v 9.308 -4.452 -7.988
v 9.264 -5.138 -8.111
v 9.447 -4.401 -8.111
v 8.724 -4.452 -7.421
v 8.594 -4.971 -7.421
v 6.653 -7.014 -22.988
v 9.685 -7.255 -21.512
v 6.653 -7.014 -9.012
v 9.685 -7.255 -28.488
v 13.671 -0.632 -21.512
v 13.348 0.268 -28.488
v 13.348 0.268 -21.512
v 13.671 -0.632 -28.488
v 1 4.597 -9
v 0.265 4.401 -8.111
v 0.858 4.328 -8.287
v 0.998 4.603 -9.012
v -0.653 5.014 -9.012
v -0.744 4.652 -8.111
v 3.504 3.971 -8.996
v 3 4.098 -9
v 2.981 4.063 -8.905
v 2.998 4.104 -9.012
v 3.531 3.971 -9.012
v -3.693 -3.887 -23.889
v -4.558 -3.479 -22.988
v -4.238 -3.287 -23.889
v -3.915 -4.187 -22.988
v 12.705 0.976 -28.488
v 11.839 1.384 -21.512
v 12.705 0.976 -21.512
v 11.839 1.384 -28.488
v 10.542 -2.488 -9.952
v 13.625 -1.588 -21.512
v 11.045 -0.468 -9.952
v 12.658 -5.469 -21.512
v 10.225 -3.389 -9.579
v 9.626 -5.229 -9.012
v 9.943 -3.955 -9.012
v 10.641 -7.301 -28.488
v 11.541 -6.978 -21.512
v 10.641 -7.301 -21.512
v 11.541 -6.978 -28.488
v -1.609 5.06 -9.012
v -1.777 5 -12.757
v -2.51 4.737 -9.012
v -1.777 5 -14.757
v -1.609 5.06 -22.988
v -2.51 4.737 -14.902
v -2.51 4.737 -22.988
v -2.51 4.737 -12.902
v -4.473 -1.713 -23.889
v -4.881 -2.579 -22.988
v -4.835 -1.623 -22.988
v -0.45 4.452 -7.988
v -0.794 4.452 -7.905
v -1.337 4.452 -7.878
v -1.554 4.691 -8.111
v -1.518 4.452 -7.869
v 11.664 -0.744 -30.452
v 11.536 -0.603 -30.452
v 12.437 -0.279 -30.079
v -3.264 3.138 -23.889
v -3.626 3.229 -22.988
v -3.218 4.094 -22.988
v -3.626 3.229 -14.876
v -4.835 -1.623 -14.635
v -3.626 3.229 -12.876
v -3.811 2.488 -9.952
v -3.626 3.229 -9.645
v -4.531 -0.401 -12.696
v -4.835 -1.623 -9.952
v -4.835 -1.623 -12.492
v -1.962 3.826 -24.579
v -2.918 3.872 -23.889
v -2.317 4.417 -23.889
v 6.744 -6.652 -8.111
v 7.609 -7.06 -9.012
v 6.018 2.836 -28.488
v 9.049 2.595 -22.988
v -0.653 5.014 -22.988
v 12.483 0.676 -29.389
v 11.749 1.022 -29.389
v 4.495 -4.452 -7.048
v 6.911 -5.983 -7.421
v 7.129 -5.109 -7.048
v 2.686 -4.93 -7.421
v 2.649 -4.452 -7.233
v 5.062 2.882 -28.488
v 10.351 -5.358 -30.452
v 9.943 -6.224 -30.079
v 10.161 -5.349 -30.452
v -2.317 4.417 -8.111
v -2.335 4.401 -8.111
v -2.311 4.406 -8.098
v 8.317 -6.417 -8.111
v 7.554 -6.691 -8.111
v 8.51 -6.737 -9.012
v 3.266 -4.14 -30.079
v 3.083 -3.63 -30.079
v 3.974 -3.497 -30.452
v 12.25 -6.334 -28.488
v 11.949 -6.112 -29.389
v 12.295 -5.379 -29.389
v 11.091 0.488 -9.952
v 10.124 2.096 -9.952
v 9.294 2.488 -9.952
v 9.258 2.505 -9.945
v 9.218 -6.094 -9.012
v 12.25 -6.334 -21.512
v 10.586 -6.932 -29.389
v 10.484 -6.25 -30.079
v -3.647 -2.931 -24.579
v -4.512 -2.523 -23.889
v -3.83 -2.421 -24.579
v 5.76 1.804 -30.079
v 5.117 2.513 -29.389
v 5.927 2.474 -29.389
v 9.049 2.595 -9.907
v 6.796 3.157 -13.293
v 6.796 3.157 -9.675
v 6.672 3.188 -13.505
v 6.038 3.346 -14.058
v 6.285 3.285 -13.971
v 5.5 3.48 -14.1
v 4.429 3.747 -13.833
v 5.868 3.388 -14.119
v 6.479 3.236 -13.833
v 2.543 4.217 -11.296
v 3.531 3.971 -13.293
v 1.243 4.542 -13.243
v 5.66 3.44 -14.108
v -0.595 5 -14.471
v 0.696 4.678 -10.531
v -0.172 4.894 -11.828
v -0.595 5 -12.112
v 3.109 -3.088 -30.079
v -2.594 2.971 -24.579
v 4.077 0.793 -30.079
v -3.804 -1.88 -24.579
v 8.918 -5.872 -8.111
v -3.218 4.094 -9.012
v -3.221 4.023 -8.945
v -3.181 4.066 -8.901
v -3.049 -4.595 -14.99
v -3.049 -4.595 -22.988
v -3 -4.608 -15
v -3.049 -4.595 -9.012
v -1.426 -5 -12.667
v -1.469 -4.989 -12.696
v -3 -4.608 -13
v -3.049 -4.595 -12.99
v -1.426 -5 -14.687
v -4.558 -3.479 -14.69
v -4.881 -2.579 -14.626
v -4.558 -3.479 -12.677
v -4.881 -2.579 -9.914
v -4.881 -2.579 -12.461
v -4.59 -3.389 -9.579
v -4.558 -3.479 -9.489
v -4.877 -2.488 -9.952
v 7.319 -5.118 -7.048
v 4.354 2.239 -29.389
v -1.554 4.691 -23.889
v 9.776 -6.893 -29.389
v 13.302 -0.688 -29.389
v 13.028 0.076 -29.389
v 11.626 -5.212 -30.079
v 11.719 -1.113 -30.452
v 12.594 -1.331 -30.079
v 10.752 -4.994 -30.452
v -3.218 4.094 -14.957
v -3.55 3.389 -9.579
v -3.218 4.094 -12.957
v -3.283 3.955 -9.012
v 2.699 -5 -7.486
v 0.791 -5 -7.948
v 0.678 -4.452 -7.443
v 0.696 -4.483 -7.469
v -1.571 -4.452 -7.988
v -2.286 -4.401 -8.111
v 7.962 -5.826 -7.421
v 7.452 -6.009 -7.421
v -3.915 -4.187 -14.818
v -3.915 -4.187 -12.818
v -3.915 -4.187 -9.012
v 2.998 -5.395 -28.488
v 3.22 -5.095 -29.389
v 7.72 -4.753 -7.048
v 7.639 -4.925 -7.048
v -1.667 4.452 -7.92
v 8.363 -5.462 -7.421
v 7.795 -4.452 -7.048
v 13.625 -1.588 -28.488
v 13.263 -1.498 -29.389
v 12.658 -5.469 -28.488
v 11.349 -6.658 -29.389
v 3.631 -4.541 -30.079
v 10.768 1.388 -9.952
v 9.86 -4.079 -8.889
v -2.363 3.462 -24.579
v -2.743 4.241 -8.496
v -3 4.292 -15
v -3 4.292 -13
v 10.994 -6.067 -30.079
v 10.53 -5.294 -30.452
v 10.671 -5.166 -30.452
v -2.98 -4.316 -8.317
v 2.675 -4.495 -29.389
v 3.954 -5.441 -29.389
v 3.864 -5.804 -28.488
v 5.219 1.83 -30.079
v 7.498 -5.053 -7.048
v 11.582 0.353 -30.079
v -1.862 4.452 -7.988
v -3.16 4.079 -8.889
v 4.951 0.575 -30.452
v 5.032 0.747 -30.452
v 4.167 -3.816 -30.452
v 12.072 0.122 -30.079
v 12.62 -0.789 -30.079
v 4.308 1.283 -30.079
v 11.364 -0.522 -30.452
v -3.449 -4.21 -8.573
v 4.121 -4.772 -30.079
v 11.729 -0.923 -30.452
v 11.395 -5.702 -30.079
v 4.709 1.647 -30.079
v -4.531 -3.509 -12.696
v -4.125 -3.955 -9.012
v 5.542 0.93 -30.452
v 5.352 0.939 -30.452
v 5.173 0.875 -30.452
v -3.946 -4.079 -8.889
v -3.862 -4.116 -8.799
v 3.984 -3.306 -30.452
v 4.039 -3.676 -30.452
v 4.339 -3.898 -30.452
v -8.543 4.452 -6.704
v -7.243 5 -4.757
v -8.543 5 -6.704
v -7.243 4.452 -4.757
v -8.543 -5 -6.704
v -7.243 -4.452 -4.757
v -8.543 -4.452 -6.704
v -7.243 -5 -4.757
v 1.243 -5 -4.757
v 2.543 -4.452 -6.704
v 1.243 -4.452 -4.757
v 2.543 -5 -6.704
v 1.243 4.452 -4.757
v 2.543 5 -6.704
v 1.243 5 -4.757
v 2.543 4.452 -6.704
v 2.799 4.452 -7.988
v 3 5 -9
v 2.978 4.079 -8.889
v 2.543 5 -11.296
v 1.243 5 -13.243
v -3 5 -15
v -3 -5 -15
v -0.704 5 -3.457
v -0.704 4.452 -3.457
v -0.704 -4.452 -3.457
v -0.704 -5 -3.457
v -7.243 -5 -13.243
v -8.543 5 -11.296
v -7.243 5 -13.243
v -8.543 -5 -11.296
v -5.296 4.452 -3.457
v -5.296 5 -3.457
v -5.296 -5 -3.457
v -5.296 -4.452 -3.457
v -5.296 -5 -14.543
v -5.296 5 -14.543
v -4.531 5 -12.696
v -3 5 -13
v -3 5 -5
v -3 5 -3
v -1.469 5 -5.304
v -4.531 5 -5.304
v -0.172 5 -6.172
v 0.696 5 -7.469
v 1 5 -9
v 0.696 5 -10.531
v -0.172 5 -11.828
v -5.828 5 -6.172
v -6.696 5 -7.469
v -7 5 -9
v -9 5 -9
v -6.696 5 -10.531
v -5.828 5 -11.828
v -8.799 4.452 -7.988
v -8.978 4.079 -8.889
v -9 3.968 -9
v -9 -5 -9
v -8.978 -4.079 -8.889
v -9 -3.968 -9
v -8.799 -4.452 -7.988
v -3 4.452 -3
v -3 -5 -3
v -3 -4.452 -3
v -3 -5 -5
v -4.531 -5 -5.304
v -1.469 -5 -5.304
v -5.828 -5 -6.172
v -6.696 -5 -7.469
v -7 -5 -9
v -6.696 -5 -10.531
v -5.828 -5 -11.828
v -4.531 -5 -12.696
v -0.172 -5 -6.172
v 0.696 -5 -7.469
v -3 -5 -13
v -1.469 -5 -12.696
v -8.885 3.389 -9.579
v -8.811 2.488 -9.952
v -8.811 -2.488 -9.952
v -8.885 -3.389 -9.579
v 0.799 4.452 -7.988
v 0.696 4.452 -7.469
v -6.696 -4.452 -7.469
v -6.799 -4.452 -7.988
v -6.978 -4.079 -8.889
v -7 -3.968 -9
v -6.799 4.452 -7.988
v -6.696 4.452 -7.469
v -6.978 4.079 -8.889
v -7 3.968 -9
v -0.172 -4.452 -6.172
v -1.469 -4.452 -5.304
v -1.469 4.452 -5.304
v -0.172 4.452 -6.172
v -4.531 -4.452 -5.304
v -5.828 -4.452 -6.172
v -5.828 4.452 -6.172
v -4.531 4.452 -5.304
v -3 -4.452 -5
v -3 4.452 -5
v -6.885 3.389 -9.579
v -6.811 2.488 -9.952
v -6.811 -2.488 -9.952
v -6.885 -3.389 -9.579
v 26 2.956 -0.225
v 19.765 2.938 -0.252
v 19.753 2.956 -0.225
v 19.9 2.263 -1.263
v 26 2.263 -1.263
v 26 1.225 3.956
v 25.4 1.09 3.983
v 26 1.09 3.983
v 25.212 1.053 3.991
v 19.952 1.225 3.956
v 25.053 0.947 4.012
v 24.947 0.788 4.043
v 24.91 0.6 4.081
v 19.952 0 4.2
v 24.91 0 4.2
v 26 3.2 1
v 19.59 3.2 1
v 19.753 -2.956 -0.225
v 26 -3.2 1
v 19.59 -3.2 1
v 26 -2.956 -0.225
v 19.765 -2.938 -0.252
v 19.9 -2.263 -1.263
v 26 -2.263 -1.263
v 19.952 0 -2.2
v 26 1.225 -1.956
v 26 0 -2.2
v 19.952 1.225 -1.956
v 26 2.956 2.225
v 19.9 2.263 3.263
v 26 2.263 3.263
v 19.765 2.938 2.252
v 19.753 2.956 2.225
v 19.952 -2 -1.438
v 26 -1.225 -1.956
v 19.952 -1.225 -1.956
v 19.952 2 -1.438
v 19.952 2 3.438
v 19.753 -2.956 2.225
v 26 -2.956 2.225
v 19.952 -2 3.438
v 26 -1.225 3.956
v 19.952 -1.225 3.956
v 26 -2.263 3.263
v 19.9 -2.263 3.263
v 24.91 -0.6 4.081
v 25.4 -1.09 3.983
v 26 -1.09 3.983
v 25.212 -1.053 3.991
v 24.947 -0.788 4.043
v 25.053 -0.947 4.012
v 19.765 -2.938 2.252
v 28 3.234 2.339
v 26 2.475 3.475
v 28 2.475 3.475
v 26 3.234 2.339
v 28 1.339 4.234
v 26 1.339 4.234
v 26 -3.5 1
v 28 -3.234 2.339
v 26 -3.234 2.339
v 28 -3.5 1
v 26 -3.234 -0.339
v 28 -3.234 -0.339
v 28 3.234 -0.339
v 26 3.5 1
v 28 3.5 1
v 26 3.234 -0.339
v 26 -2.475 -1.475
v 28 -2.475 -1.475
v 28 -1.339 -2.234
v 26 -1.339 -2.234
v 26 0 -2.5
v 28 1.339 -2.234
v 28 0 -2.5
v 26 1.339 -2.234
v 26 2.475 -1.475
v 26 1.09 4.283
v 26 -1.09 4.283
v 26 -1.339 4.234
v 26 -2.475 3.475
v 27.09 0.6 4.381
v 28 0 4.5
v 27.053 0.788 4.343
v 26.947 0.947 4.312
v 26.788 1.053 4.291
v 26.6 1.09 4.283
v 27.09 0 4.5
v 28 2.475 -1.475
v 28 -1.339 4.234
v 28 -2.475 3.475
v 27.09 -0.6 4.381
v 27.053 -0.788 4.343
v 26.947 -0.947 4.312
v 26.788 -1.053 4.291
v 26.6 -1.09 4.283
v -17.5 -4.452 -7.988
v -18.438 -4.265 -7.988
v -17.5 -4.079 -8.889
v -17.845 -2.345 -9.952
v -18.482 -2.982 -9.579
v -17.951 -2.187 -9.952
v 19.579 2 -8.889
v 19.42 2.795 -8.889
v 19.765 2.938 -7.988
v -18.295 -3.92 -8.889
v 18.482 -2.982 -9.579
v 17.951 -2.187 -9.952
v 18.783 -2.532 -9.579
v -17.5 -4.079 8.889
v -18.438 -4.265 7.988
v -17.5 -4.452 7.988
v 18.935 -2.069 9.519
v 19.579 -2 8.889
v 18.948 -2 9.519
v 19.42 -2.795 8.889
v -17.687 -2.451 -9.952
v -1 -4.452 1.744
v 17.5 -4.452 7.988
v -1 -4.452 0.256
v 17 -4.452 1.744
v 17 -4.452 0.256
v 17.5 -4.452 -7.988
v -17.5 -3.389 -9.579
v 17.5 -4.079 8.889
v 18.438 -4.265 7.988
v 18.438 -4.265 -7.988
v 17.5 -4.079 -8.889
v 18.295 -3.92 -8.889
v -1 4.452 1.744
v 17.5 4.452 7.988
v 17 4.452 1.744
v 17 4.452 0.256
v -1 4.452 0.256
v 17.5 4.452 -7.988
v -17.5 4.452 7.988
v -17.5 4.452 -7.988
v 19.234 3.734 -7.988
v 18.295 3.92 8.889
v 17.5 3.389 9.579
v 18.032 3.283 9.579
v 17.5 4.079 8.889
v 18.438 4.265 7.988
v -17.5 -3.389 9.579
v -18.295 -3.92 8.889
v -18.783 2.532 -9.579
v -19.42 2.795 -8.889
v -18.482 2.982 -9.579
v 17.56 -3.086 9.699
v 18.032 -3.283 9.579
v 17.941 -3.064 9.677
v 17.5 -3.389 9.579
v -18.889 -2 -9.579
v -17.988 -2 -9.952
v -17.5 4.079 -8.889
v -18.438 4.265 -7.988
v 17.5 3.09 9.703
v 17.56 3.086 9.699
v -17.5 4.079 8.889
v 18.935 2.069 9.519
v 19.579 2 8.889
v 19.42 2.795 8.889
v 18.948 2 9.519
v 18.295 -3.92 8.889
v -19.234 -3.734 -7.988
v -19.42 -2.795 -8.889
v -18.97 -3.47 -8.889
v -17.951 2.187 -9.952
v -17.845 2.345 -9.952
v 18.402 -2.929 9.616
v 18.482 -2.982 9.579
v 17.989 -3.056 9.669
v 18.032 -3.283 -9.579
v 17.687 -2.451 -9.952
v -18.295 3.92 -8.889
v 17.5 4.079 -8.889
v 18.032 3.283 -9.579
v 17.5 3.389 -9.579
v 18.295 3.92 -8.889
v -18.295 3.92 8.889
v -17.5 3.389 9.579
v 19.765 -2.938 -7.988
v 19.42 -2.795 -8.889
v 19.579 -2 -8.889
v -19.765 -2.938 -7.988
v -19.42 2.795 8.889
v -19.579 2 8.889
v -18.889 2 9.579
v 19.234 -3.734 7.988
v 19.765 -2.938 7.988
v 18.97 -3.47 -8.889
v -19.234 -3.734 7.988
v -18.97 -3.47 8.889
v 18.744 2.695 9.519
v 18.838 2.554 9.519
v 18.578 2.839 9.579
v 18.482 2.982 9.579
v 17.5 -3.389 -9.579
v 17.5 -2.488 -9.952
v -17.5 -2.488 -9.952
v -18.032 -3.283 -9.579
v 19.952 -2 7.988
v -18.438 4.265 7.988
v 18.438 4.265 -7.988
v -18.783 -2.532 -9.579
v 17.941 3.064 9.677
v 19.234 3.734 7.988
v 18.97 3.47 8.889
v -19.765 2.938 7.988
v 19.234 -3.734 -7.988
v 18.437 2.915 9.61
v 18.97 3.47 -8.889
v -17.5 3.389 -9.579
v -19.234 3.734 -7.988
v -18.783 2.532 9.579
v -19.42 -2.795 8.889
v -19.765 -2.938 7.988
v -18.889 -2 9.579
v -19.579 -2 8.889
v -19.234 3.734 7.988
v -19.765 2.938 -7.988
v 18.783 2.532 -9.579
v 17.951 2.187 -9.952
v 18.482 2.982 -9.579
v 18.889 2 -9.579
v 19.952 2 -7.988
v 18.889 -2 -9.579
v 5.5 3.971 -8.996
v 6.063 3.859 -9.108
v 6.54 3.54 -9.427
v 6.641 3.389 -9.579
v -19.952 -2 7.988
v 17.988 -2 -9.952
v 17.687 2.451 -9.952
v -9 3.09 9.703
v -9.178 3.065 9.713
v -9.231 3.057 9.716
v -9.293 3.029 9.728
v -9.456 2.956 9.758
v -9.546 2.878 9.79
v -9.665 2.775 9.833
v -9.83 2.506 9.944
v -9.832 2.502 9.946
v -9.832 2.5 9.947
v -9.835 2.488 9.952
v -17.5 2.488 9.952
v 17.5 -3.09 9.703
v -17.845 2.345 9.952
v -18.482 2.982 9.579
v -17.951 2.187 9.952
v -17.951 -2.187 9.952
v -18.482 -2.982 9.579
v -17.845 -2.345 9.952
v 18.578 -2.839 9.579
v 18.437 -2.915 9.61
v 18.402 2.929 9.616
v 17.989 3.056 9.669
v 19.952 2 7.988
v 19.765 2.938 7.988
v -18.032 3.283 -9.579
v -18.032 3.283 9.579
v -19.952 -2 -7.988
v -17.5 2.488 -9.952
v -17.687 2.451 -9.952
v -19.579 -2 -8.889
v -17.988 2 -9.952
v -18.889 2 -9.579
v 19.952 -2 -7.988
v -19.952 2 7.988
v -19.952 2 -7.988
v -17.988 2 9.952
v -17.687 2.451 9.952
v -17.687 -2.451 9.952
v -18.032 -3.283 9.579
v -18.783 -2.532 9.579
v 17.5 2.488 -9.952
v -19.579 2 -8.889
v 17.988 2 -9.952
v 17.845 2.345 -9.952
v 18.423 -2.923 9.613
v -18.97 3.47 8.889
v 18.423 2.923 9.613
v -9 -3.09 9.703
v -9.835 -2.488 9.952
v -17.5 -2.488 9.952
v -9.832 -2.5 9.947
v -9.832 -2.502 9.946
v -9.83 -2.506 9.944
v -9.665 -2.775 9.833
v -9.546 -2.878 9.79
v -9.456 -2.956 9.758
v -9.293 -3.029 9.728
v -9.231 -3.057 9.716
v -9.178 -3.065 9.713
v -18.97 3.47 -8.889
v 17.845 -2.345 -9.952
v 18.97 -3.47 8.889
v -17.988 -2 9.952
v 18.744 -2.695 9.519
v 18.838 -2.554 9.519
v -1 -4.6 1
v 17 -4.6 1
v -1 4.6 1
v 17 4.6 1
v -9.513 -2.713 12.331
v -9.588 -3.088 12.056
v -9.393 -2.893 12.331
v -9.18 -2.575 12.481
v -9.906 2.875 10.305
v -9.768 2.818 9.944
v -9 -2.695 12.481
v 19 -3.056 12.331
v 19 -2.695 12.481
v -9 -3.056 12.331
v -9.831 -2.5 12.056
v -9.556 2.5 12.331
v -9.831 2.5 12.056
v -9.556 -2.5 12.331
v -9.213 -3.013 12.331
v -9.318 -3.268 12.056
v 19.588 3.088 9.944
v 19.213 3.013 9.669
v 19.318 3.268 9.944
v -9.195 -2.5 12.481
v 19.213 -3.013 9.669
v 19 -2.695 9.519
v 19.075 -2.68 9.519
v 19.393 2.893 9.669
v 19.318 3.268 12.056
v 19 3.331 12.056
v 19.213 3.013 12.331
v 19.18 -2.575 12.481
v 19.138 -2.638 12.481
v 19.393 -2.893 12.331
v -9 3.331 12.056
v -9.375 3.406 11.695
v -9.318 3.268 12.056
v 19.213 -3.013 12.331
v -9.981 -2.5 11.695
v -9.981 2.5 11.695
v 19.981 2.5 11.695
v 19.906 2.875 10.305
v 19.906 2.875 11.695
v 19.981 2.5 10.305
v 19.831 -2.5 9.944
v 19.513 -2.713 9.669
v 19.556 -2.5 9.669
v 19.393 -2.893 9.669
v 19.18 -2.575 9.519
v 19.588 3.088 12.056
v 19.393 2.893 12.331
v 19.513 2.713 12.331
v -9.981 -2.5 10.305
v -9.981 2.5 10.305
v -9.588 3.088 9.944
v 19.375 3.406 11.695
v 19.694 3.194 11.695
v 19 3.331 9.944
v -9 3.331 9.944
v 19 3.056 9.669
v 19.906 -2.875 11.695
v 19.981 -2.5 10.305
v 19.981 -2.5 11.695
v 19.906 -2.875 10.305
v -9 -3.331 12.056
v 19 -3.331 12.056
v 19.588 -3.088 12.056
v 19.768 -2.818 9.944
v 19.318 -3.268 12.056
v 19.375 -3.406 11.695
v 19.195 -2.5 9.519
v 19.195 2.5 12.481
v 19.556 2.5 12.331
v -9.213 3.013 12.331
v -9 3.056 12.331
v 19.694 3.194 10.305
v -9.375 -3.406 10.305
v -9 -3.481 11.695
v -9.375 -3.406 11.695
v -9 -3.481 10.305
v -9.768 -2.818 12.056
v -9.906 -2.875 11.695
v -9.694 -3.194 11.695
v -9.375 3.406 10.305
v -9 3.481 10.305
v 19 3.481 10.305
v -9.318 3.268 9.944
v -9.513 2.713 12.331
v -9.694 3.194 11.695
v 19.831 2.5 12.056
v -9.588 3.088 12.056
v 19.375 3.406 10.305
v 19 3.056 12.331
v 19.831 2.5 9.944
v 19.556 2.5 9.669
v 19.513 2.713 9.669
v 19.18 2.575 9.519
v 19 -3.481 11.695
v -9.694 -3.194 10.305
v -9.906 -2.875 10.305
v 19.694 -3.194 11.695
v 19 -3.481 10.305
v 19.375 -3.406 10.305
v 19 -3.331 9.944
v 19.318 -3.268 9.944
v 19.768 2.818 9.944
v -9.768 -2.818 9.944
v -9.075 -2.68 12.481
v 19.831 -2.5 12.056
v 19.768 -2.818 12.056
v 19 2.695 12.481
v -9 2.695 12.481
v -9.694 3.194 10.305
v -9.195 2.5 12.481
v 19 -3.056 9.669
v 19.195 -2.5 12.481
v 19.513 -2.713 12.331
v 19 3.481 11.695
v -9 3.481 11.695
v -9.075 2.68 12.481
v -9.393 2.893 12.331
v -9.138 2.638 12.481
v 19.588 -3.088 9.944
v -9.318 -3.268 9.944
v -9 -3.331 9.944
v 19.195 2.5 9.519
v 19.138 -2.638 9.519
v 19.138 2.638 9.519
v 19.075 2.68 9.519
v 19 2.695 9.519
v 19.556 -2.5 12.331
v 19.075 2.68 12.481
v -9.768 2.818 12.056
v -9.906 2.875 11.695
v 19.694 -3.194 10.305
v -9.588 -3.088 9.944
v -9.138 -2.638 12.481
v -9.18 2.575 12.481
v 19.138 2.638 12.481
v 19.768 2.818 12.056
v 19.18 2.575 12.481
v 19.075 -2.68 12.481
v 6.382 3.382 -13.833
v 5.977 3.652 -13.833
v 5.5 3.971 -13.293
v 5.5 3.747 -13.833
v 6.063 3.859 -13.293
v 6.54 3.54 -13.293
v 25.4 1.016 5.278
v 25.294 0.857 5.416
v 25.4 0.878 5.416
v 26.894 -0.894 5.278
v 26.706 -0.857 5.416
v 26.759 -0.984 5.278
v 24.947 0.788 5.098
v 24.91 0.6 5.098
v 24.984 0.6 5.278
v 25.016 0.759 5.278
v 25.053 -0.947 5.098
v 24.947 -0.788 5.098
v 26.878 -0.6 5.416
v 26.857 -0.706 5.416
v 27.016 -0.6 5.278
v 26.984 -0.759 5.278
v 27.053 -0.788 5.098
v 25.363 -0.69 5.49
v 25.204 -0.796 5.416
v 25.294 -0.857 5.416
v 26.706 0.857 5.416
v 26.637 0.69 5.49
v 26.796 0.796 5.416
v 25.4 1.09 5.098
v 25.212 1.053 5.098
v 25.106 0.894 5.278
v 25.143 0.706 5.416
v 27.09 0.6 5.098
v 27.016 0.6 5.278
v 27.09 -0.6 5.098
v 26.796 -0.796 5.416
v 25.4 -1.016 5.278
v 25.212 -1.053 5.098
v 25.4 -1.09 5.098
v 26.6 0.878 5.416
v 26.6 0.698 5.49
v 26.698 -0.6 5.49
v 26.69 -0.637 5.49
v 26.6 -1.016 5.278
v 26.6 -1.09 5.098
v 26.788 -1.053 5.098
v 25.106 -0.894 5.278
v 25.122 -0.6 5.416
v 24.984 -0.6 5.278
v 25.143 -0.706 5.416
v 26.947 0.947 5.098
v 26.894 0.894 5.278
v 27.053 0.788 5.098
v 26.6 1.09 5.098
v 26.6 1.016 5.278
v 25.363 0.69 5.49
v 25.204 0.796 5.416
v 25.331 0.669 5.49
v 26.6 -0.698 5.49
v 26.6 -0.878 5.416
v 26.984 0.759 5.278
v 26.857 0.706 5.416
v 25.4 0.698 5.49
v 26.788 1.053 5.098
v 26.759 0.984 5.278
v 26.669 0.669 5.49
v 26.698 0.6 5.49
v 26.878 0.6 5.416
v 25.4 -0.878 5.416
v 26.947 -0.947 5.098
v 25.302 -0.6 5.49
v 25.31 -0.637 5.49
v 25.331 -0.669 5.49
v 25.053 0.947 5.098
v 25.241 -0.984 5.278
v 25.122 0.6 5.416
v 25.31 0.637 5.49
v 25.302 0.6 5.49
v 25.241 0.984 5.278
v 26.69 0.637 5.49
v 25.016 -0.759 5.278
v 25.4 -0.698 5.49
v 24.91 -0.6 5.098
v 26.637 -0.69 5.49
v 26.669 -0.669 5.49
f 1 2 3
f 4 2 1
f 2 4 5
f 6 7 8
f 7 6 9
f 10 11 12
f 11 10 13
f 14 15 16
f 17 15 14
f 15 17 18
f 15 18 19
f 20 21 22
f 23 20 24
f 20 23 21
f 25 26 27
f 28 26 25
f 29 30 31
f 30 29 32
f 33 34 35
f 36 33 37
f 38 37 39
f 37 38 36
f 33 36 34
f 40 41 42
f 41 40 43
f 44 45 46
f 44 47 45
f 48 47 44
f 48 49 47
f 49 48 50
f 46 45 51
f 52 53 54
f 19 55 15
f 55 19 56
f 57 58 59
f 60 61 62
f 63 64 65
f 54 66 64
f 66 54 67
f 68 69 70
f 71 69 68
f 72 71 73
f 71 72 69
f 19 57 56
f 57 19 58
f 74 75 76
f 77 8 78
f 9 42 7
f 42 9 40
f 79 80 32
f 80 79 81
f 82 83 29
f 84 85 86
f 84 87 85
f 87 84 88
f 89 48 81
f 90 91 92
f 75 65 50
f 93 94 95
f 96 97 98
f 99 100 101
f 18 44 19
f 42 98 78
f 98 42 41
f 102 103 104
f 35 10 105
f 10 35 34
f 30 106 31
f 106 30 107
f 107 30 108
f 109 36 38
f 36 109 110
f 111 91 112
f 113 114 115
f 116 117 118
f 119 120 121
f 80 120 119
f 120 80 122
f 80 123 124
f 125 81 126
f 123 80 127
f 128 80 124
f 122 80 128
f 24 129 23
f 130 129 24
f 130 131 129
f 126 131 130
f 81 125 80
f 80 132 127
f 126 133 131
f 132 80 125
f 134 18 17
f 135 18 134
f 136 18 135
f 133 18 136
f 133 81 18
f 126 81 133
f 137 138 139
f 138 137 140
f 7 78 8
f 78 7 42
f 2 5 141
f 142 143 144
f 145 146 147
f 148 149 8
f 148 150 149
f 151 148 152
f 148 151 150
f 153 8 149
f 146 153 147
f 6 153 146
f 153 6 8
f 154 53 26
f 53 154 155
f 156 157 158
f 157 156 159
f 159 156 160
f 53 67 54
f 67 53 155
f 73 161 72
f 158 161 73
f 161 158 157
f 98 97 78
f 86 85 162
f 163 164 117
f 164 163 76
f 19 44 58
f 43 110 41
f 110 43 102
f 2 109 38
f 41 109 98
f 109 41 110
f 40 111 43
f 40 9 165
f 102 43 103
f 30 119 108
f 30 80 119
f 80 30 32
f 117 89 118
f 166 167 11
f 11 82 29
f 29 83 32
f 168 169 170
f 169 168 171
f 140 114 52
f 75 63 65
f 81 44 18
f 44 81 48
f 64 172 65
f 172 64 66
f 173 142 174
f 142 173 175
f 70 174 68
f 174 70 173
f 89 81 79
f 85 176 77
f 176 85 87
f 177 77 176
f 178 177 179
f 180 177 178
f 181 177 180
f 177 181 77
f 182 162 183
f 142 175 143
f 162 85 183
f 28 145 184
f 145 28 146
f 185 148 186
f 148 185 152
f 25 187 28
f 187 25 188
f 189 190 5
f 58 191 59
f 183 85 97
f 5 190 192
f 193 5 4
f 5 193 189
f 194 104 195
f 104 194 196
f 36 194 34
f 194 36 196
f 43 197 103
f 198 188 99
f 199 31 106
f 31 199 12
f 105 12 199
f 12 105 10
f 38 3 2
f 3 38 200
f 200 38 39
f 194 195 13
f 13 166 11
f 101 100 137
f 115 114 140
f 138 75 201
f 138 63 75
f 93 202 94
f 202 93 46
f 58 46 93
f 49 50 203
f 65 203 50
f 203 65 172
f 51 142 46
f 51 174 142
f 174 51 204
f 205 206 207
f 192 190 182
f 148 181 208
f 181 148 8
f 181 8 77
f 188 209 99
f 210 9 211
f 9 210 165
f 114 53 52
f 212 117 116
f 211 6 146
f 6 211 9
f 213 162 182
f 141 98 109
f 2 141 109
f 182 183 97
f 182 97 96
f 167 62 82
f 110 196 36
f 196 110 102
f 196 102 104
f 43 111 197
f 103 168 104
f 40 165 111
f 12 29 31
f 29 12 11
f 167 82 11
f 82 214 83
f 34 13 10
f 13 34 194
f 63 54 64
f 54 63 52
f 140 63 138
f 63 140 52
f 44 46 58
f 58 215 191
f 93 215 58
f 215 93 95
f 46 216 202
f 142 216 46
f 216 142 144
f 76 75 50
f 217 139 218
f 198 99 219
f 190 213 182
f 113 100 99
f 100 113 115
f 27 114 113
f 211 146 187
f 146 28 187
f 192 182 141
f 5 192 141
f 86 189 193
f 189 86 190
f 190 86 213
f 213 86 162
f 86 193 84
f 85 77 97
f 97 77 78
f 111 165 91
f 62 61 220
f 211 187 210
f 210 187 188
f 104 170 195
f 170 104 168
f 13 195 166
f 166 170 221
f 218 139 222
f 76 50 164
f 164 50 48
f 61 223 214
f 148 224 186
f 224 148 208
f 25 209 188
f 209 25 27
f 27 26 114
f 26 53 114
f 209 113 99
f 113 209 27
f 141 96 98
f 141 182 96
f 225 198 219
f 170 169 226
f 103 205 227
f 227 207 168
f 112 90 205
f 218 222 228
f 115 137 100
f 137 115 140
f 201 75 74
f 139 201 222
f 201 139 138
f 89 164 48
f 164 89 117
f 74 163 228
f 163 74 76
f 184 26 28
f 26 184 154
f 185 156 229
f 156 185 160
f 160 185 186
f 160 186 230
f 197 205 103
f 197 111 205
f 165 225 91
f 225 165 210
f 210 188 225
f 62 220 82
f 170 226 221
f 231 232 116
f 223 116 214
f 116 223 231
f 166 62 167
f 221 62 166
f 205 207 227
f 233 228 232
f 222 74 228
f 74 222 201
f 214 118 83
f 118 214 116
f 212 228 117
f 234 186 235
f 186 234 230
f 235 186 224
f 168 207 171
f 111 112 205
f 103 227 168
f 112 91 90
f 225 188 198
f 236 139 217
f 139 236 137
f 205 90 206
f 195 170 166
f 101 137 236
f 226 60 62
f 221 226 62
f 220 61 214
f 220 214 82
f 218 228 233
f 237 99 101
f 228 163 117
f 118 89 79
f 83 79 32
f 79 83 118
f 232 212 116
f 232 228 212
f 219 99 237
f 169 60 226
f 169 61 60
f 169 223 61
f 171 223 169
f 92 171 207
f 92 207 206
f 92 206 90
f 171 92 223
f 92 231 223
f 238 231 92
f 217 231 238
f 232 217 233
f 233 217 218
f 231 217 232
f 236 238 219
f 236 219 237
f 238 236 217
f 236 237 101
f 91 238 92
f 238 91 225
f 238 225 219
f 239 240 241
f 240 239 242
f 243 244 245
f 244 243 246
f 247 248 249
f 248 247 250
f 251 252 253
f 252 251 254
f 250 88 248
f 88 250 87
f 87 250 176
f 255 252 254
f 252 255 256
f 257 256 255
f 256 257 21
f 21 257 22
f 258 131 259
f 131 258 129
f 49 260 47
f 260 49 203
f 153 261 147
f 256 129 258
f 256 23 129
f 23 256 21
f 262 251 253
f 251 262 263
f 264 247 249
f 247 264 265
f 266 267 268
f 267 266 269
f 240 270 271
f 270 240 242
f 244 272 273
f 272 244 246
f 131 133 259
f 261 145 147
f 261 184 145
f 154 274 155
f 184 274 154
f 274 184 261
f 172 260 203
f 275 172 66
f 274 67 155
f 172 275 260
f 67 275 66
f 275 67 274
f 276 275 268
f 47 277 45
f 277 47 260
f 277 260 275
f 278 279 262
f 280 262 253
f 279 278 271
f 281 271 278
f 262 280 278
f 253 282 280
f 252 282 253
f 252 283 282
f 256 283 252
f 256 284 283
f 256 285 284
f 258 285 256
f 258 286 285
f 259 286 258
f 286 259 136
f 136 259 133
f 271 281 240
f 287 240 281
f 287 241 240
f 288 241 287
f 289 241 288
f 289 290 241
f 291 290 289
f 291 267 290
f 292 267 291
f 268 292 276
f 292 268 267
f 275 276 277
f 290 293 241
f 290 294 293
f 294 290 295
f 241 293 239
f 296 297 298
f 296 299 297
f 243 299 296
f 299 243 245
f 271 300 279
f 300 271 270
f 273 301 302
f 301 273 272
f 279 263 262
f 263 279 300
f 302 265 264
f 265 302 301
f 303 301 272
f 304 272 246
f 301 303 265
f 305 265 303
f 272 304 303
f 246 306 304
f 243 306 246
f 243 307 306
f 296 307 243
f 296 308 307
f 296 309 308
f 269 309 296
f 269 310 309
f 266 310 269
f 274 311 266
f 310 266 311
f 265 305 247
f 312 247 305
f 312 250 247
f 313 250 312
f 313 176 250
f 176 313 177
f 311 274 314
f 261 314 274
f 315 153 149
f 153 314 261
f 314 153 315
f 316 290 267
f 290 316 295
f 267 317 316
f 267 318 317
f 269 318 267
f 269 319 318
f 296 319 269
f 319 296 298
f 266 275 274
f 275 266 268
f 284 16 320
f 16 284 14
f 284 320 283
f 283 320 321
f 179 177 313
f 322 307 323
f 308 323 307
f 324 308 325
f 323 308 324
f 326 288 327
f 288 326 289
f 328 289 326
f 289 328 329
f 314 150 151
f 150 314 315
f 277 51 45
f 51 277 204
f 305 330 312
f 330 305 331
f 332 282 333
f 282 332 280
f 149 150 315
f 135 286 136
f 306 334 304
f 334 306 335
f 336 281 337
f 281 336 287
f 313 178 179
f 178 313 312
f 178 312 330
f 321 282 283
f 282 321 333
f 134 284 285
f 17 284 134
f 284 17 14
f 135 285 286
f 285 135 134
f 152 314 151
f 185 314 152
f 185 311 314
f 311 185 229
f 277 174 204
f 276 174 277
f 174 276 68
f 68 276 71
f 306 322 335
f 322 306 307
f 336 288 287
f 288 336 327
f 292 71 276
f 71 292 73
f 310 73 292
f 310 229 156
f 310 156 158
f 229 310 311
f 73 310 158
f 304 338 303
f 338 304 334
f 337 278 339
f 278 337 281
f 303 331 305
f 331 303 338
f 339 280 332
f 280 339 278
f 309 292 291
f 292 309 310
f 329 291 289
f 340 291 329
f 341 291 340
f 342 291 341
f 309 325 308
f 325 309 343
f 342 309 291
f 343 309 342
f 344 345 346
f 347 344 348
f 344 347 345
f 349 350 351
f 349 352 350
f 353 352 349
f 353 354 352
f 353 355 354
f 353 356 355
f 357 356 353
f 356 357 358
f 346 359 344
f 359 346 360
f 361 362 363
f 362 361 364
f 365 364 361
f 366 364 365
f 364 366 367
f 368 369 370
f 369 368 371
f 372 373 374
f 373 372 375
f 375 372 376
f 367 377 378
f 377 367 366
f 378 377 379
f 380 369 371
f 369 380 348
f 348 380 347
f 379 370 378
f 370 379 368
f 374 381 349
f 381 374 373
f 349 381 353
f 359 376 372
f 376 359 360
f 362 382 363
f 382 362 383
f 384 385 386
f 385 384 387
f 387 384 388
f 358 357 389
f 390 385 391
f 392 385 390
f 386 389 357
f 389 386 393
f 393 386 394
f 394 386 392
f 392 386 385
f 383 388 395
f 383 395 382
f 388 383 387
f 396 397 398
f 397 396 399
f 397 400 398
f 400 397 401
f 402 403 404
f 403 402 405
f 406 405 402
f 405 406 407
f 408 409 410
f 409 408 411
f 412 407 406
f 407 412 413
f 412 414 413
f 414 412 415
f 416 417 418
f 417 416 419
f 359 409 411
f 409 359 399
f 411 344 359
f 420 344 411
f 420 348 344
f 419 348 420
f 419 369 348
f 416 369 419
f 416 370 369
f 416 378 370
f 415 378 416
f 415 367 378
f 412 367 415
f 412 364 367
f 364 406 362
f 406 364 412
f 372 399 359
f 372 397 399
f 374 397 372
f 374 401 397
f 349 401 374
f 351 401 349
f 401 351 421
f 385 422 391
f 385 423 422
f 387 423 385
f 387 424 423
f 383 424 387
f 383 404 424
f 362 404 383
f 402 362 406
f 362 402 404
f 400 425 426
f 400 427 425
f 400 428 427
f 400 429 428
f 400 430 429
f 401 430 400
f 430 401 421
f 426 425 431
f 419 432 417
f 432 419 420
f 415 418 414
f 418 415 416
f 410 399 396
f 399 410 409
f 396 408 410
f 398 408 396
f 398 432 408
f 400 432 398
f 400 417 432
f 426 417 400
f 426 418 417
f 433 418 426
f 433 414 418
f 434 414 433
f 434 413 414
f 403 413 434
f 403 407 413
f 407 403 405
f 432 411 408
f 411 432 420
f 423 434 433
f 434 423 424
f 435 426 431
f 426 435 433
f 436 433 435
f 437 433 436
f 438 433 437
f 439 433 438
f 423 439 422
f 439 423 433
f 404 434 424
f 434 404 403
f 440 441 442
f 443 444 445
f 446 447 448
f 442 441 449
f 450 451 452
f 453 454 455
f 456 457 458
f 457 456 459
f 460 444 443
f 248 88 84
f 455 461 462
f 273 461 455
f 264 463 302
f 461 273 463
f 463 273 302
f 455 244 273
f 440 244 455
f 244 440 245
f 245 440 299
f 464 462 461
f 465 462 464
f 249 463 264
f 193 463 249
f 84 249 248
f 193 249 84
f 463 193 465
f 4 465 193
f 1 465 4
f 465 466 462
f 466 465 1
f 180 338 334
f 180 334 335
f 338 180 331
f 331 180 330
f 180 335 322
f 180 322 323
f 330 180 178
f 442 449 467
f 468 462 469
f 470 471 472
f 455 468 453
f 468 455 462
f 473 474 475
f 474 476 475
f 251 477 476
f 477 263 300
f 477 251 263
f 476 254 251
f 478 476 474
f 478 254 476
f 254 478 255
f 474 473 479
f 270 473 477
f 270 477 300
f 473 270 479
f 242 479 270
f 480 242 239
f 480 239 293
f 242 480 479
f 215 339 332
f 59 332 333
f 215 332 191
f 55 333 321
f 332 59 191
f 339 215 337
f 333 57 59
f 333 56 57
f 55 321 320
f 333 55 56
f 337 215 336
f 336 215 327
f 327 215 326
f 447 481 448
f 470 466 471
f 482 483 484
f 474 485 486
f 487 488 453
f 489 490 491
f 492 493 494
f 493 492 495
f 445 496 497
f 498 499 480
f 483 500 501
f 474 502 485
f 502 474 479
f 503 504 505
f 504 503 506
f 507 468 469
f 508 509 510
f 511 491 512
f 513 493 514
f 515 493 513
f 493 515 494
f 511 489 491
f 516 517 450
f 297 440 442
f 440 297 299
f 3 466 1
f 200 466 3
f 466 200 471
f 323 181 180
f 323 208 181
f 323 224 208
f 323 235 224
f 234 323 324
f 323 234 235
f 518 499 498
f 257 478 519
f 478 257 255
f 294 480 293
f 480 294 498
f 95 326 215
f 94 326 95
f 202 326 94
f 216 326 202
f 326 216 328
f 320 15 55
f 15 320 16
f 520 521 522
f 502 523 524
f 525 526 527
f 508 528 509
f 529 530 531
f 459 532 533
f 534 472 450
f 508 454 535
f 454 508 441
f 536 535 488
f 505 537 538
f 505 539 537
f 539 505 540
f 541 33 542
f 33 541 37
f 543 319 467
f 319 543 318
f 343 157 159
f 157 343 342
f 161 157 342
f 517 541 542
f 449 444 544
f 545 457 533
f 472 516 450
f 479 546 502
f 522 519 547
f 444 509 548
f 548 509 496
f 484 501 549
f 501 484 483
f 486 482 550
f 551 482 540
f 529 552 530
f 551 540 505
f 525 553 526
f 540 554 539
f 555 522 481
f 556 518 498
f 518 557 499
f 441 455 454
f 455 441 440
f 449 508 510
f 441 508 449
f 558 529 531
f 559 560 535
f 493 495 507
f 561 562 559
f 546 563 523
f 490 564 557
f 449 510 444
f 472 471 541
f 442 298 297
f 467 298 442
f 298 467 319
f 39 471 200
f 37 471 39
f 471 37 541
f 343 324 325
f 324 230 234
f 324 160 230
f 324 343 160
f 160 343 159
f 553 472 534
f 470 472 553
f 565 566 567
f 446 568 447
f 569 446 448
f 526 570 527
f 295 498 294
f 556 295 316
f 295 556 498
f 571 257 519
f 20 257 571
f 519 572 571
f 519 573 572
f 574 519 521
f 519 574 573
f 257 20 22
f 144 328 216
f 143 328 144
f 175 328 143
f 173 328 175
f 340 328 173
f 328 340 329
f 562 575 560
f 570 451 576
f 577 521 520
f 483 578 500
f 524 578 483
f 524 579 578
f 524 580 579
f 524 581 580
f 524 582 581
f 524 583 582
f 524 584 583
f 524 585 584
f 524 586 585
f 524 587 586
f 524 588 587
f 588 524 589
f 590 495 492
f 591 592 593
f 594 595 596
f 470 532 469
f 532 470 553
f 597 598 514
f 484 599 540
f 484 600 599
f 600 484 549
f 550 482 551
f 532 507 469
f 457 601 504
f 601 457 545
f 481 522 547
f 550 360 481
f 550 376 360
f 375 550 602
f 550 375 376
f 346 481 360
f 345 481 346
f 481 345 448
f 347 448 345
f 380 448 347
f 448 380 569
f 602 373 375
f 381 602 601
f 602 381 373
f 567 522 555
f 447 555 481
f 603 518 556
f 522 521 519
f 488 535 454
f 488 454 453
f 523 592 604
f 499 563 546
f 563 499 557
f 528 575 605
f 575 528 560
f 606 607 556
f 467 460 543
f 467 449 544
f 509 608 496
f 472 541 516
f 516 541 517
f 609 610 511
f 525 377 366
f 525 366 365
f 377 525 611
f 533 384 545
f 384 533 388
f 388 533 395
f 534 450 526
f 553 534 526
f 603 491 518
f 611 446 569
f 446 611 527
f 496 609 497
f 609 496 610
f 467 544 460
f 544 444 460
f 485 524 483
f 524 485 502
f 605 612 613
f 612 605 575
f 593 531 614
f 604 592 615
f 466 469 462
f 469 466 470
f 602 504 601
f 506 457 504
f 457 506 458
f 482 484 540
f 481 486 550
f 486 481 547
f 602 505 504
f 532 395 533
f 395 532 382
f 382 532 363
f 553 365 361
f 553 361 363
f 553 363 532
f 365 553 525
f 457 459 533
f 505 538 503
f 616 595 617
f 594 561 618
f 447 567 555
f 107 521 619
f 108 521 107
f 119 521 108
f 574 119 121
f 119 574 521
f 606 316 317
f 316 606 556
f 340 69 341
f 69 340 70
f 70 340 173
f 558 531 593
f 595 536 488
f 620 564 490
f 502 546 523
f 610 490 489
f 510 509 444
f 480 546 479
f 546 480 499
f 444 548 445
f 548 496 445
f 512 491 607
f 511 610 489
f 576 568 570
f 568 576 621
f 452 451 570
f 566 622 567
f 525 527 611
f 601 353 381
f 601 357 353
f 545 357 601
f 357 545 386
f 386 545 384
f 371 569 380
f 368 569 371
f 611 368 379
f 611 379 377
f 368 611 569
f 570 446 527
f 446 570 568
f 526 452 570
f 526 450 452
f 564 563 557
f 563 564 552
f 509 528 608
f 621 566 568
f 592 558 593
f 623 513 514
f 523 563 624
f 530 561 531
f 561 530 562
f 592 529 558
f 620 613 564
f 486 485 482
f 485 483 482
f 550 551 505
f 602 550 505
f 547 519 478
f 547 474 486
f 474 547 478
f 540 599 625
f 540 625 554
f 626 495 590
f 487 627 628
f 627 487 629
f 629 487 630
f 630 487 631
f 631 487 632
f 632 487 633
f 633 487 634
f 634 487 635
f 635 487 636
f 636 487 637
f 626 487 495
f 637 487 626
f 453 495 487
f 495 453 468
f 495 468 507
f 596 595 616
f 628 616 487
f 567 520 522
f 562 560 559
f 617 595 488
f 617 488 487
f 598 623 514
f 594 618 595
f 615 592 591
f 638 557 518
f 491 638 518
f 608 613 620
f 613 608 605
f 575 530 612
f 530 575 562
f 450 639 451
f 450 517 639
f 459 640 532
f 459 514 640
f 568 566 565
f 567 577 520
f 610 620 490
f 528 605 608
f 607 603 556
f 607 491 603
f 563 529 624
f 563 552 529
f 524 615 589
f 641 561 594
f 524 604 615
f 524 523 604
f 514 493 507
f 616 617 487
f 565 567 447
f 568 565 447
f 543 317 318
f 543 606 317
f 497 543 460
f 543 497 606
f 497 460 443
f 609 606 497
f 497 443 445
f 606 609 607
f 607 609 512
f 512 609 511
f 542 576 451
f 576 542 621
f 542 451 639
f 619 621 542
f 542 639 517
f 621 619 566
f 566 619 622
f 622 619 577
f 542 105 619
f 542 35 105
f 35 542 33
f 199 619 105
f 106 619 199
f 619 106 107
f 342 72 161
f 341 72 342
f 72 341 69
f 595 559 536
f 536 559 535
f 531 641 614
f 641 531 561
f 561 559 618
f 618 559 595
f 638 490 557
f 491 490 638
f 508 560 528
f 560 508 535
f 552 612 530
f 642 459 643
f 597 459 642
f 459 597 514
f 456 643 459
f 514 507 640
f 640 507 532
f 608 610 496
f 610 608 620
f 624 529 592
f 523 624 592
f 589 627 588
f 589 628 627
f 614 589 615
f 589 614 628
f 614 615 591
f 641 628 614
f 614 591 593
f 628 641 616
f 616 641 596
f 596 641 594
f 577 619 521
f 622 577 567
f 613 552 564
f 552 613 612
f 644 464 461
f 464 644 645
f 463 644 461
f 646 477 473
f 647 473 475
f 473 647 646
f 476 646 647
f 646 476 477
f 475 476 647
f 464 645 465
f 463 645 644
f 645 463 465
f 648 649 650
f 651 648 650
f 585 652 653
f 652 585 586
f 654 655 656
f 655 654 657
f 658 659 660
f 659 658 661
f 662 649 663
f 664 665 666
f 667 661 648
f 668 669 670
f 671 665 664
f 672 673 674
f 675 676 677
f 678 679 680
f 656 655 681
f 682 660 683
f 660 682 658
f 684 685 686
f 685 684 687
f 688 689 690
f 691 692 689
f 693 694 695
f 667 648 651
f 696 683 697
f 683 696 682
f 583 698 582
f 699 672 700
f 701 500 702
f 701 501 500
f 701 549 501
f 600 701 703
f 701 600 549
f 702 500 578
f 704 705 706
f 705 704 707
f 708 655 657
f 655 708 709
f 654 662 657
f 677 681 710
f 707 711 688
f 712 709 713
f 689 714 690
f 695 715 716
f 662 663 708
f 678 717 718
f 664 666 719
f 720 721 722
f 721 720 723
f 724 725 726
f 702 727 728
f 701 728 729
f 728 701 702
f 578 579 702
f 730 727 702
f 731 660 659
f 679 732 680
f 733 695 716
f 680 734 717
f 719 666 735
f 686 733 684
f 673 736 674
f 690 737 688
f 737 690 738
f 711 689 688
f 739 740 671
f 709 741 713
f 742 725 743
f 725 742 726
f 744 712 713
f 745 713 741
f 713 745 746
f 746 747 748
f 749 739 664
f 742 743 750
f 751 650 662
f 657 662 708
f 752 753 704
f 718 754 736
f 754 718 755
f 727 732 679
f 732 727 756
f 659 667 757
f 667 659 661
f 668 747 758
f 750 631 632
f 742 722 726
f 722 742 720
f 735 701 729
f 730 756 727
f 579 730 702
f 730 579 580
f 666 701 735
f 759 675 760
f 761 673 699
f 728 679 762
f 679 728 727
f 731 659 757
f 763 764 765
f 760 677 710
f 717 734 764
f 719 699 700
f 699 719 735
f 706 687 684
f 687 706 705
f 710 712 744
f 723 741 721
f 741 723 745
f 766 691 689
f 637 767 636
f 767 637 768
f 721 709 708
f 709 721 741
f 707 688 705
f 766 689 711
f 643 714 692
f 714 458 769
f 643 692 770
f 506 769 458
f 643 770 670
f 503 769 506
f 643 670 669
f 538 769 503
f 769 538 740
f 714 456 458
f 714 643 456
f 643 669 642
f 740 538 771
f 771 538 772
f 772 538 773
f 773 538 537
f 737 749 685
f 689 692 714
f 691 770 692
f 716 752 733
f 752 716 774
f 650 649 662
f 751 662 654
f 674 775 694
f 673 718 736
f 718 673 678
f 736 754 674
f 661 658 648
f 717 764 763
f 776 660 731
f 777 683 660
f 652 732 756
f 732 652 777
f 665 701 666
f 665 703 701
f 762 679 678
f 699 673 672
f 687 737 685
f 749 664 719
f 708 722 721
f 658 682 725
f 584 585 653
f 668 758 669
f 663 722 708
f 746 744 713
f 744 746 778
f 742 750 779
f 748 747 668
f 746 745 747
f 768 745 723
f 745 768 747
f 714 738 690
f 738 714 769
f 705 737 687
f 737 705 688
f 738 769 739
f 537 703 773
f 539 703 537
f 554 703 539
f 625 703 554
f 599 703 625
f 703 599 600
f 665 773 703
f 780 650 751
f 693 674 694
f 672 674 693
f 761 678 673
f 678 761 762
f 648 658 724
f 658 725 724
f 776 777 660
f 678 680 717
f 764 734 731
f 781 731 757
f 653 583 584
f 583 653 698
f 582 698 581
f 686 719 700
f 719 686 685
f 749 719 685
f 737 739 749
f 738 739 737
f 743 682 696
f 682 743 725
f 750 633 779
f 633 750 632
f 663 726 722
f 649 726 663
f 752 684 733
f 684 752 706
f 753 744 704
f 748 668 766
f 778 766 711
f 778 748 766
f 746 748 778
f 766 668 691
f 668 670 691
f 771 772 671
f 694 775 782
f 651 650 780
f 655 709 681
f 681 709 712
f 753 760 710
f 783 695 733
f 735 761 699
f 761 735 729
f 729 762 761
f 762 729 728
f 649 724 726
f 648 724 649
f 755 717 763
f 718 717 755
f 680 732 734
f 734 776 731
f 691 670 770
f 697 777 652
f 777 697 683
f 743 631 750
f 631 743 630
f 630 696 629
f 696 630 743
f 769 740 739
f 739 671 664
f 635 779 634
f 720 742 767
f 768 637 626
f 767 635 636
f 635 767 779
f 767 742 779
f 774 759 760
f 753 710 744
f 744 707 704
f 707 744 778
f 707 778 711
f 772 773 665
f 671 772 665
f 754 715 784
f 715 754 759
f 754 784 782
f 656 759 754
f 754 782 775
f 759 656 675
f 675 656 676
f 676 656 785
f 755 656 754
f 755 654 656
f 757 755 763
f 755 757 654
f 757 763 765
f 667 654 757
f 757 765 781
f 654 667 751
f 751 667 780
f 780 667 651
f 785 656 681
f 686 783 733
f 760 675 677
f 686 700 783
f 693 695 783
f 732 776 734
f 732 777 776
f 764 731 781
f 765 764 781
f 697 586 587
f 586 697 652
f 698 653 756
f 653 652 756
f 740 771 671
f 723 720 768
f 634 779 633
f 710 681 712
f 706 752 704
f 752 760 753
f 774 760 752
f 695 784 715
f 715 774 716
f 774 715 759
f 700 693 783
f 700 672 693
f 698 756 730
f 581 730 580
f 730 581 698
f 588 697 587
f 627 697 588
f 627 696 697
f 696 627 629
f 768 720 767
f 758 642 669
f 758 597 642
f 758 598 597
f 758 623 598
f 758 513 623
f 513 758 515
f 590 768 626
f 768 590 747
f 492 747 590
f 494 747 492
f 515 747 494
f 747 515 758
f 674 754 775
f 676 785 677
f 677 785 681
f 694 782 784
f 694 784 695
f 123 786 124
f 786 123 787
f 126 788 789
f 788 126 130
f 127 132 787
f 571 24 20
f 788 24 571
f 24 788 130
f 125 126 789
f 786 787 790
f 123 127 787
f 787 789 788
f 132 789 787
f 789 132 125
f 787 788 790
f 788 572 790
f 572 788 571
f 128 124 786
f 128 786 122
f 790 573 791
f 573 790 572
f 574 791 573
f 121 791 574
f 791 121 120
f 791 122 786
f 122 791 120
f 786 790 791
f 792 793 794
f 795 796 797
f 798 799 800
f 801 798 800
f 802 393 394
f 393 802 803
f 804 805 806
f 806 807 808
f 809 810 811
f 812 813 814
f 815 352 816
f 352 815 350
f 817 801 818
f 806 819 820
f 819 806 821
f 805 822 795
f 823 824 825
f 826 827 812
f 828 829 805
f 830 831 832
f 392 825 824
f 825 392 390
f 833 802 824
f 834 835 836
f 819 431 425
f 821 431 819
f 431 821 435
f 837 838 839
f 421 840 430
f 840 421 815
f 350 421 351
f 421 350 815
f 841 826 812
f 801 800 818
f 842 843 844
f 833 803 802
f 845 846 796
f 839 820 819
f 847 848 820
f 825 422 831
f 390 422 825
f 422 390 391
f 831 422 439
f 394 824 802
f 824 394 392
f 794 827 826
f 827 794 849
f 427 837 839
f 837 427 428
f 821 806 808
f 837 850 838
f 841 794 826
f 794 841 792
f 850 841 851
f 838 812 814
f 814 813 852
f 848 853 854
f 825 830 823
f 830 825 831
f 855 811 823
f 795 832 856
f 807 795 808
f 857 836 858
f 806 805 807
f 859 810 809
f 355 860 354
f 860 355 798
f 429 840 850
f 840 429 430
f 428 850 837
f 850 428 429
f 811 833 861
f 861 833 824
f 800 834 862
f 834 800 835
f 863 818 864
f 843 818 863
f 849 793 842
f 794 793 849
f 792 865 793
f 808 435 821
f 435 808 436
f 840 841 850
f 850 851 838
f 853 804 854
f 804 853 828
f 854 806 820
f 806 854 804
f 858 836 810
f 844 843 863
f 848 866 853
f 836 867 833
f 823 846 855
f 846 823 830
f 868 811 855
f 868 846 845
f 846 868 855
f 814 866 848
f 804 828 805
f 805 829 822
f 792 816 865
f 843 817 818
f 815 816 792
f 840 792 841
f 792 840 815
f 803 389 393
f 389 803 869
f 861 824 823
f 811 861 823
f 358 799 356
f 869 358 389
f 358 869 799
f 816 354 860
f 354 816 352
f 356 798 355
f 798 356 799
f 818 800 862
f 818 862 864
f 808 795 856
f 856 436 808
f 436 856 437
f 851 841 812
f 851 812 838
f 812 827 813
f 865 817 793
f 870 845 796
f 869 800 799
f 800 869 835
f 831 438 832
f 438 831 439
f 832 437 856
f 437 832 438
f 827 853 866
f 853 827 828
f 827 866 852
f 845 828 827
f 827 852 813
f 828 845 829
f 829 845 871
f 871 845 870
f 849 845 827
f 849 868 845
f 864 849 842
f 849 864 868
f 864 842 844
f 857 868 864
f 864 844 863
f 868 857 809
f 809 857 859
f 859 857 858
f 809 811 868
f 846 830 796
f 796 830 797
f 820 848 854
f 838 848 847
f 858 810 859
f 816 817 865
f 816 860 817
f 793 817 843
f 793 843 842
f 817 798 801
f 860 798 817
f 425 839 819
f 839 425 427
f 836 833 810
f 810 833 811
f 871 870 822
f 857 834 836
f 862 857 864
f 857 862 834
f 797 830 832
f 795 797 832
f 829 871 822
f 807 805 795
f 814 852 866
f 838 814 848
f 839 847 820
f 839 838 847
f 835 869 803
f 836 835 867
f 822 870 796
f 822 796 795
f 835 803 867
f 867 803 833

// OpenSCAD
// 手枪枪身（不含套筒）— 精细版 v2
// 约定：+X = 枪口方向，+Z = 上，握把向下(-Z)
$fn = 16;

module rbox(x,y,z,r=1.2){
  hull(){
    translate([-x/2+r,-y/2+r,-z/2+r]) sphere(r);
    translate([ x/2-r,-y/2+r,-z/2+r]) sphere(r);
    translate([-x/2+r, y/2-r,-z/2+r]) sphere(r);
    translate([ x/2-r, y/2-r,-z/2+r]) sphere(r);
    translate([-x/2+r,-y/2+r, z/2-r]) sphere(r);
    translate([ x/2-r,-y/2+r, z/2-r]) sphere(r);
    translate([-x/2+r, y/2-r, z/2-r]) sphere(r);
    translate([ x/2-r, y/2-r, z/2-r]) sphere(r);
  }
}

COL_FRAME = "#42474f";
COL_GRIP  = "#23272e";
COL_DARK  = "#15181c";
COL_STEEL = "#6b7178";

// 底把 frame（机匣下部）
color(COL_FRAME) rbox(40,9,20,2.5);

// 握把 grip：从 frame 下方后倾伸出
color(COL_GRIP){
  translate([3,-1,-4]) rotate([0,0,-14]){
    translate([0,0,-12]) hull(){
      rbox(15,10,18,2.5);
      translate([5,0,-9]) rbox(11,9,11,2.5);
    }
    // 握把底盖
    translate([2,0,-20]) rbox(12,9,3,1.5);
  }
}

// 扳机护圈 trigger guard（镂空圆环）
color(COL_DARK){
  difference(){
    translate([-3,0,-9]) rotate([90,0,0]) cylinder(h=10,r=6,center=true);
    translate([-3,0,-9]) rotate([90,0,0]) cylinder(h=10.8,r=4,center=true);
  }
}
// 扳机
color(COL_DARK) translate([-3,0,-6.5]) rotate([90,0,0]) cylinder(h=3.2,r=1.1,center=true);

// 复进簧筒（套筒座内）
color(COL_FRAME) translate([8,0,1]) rotate([0,90,0]) cylinder(h=18,r=4.6,center=true);

// 枪管 barrel：短粗，沿 +X 露出
color(COL_STEEL){
  translate([18,0,1]) rotate([0,90,0]) cylinder(h=18,r=3.2,center=true);
  // 枪口帽
  translate([27,0,1]) rotate([0,90,0]) cylinder(h=2,r=3.5,center=true);
}

// 套筒导轨座（顶部，供套筒滑配）
color(COL_DARK) translate([5,0,11]) rbox(30,7,3,1);

// 弹匣井 magazine well（底部）
color(COL_FRAME) translate([2,0,-11]) rbox(10,8,7,1.5);

// 准星基座
color(COL_DARK) translate([26,0,4]) rbox(2.2,2.2,3,0.5);
